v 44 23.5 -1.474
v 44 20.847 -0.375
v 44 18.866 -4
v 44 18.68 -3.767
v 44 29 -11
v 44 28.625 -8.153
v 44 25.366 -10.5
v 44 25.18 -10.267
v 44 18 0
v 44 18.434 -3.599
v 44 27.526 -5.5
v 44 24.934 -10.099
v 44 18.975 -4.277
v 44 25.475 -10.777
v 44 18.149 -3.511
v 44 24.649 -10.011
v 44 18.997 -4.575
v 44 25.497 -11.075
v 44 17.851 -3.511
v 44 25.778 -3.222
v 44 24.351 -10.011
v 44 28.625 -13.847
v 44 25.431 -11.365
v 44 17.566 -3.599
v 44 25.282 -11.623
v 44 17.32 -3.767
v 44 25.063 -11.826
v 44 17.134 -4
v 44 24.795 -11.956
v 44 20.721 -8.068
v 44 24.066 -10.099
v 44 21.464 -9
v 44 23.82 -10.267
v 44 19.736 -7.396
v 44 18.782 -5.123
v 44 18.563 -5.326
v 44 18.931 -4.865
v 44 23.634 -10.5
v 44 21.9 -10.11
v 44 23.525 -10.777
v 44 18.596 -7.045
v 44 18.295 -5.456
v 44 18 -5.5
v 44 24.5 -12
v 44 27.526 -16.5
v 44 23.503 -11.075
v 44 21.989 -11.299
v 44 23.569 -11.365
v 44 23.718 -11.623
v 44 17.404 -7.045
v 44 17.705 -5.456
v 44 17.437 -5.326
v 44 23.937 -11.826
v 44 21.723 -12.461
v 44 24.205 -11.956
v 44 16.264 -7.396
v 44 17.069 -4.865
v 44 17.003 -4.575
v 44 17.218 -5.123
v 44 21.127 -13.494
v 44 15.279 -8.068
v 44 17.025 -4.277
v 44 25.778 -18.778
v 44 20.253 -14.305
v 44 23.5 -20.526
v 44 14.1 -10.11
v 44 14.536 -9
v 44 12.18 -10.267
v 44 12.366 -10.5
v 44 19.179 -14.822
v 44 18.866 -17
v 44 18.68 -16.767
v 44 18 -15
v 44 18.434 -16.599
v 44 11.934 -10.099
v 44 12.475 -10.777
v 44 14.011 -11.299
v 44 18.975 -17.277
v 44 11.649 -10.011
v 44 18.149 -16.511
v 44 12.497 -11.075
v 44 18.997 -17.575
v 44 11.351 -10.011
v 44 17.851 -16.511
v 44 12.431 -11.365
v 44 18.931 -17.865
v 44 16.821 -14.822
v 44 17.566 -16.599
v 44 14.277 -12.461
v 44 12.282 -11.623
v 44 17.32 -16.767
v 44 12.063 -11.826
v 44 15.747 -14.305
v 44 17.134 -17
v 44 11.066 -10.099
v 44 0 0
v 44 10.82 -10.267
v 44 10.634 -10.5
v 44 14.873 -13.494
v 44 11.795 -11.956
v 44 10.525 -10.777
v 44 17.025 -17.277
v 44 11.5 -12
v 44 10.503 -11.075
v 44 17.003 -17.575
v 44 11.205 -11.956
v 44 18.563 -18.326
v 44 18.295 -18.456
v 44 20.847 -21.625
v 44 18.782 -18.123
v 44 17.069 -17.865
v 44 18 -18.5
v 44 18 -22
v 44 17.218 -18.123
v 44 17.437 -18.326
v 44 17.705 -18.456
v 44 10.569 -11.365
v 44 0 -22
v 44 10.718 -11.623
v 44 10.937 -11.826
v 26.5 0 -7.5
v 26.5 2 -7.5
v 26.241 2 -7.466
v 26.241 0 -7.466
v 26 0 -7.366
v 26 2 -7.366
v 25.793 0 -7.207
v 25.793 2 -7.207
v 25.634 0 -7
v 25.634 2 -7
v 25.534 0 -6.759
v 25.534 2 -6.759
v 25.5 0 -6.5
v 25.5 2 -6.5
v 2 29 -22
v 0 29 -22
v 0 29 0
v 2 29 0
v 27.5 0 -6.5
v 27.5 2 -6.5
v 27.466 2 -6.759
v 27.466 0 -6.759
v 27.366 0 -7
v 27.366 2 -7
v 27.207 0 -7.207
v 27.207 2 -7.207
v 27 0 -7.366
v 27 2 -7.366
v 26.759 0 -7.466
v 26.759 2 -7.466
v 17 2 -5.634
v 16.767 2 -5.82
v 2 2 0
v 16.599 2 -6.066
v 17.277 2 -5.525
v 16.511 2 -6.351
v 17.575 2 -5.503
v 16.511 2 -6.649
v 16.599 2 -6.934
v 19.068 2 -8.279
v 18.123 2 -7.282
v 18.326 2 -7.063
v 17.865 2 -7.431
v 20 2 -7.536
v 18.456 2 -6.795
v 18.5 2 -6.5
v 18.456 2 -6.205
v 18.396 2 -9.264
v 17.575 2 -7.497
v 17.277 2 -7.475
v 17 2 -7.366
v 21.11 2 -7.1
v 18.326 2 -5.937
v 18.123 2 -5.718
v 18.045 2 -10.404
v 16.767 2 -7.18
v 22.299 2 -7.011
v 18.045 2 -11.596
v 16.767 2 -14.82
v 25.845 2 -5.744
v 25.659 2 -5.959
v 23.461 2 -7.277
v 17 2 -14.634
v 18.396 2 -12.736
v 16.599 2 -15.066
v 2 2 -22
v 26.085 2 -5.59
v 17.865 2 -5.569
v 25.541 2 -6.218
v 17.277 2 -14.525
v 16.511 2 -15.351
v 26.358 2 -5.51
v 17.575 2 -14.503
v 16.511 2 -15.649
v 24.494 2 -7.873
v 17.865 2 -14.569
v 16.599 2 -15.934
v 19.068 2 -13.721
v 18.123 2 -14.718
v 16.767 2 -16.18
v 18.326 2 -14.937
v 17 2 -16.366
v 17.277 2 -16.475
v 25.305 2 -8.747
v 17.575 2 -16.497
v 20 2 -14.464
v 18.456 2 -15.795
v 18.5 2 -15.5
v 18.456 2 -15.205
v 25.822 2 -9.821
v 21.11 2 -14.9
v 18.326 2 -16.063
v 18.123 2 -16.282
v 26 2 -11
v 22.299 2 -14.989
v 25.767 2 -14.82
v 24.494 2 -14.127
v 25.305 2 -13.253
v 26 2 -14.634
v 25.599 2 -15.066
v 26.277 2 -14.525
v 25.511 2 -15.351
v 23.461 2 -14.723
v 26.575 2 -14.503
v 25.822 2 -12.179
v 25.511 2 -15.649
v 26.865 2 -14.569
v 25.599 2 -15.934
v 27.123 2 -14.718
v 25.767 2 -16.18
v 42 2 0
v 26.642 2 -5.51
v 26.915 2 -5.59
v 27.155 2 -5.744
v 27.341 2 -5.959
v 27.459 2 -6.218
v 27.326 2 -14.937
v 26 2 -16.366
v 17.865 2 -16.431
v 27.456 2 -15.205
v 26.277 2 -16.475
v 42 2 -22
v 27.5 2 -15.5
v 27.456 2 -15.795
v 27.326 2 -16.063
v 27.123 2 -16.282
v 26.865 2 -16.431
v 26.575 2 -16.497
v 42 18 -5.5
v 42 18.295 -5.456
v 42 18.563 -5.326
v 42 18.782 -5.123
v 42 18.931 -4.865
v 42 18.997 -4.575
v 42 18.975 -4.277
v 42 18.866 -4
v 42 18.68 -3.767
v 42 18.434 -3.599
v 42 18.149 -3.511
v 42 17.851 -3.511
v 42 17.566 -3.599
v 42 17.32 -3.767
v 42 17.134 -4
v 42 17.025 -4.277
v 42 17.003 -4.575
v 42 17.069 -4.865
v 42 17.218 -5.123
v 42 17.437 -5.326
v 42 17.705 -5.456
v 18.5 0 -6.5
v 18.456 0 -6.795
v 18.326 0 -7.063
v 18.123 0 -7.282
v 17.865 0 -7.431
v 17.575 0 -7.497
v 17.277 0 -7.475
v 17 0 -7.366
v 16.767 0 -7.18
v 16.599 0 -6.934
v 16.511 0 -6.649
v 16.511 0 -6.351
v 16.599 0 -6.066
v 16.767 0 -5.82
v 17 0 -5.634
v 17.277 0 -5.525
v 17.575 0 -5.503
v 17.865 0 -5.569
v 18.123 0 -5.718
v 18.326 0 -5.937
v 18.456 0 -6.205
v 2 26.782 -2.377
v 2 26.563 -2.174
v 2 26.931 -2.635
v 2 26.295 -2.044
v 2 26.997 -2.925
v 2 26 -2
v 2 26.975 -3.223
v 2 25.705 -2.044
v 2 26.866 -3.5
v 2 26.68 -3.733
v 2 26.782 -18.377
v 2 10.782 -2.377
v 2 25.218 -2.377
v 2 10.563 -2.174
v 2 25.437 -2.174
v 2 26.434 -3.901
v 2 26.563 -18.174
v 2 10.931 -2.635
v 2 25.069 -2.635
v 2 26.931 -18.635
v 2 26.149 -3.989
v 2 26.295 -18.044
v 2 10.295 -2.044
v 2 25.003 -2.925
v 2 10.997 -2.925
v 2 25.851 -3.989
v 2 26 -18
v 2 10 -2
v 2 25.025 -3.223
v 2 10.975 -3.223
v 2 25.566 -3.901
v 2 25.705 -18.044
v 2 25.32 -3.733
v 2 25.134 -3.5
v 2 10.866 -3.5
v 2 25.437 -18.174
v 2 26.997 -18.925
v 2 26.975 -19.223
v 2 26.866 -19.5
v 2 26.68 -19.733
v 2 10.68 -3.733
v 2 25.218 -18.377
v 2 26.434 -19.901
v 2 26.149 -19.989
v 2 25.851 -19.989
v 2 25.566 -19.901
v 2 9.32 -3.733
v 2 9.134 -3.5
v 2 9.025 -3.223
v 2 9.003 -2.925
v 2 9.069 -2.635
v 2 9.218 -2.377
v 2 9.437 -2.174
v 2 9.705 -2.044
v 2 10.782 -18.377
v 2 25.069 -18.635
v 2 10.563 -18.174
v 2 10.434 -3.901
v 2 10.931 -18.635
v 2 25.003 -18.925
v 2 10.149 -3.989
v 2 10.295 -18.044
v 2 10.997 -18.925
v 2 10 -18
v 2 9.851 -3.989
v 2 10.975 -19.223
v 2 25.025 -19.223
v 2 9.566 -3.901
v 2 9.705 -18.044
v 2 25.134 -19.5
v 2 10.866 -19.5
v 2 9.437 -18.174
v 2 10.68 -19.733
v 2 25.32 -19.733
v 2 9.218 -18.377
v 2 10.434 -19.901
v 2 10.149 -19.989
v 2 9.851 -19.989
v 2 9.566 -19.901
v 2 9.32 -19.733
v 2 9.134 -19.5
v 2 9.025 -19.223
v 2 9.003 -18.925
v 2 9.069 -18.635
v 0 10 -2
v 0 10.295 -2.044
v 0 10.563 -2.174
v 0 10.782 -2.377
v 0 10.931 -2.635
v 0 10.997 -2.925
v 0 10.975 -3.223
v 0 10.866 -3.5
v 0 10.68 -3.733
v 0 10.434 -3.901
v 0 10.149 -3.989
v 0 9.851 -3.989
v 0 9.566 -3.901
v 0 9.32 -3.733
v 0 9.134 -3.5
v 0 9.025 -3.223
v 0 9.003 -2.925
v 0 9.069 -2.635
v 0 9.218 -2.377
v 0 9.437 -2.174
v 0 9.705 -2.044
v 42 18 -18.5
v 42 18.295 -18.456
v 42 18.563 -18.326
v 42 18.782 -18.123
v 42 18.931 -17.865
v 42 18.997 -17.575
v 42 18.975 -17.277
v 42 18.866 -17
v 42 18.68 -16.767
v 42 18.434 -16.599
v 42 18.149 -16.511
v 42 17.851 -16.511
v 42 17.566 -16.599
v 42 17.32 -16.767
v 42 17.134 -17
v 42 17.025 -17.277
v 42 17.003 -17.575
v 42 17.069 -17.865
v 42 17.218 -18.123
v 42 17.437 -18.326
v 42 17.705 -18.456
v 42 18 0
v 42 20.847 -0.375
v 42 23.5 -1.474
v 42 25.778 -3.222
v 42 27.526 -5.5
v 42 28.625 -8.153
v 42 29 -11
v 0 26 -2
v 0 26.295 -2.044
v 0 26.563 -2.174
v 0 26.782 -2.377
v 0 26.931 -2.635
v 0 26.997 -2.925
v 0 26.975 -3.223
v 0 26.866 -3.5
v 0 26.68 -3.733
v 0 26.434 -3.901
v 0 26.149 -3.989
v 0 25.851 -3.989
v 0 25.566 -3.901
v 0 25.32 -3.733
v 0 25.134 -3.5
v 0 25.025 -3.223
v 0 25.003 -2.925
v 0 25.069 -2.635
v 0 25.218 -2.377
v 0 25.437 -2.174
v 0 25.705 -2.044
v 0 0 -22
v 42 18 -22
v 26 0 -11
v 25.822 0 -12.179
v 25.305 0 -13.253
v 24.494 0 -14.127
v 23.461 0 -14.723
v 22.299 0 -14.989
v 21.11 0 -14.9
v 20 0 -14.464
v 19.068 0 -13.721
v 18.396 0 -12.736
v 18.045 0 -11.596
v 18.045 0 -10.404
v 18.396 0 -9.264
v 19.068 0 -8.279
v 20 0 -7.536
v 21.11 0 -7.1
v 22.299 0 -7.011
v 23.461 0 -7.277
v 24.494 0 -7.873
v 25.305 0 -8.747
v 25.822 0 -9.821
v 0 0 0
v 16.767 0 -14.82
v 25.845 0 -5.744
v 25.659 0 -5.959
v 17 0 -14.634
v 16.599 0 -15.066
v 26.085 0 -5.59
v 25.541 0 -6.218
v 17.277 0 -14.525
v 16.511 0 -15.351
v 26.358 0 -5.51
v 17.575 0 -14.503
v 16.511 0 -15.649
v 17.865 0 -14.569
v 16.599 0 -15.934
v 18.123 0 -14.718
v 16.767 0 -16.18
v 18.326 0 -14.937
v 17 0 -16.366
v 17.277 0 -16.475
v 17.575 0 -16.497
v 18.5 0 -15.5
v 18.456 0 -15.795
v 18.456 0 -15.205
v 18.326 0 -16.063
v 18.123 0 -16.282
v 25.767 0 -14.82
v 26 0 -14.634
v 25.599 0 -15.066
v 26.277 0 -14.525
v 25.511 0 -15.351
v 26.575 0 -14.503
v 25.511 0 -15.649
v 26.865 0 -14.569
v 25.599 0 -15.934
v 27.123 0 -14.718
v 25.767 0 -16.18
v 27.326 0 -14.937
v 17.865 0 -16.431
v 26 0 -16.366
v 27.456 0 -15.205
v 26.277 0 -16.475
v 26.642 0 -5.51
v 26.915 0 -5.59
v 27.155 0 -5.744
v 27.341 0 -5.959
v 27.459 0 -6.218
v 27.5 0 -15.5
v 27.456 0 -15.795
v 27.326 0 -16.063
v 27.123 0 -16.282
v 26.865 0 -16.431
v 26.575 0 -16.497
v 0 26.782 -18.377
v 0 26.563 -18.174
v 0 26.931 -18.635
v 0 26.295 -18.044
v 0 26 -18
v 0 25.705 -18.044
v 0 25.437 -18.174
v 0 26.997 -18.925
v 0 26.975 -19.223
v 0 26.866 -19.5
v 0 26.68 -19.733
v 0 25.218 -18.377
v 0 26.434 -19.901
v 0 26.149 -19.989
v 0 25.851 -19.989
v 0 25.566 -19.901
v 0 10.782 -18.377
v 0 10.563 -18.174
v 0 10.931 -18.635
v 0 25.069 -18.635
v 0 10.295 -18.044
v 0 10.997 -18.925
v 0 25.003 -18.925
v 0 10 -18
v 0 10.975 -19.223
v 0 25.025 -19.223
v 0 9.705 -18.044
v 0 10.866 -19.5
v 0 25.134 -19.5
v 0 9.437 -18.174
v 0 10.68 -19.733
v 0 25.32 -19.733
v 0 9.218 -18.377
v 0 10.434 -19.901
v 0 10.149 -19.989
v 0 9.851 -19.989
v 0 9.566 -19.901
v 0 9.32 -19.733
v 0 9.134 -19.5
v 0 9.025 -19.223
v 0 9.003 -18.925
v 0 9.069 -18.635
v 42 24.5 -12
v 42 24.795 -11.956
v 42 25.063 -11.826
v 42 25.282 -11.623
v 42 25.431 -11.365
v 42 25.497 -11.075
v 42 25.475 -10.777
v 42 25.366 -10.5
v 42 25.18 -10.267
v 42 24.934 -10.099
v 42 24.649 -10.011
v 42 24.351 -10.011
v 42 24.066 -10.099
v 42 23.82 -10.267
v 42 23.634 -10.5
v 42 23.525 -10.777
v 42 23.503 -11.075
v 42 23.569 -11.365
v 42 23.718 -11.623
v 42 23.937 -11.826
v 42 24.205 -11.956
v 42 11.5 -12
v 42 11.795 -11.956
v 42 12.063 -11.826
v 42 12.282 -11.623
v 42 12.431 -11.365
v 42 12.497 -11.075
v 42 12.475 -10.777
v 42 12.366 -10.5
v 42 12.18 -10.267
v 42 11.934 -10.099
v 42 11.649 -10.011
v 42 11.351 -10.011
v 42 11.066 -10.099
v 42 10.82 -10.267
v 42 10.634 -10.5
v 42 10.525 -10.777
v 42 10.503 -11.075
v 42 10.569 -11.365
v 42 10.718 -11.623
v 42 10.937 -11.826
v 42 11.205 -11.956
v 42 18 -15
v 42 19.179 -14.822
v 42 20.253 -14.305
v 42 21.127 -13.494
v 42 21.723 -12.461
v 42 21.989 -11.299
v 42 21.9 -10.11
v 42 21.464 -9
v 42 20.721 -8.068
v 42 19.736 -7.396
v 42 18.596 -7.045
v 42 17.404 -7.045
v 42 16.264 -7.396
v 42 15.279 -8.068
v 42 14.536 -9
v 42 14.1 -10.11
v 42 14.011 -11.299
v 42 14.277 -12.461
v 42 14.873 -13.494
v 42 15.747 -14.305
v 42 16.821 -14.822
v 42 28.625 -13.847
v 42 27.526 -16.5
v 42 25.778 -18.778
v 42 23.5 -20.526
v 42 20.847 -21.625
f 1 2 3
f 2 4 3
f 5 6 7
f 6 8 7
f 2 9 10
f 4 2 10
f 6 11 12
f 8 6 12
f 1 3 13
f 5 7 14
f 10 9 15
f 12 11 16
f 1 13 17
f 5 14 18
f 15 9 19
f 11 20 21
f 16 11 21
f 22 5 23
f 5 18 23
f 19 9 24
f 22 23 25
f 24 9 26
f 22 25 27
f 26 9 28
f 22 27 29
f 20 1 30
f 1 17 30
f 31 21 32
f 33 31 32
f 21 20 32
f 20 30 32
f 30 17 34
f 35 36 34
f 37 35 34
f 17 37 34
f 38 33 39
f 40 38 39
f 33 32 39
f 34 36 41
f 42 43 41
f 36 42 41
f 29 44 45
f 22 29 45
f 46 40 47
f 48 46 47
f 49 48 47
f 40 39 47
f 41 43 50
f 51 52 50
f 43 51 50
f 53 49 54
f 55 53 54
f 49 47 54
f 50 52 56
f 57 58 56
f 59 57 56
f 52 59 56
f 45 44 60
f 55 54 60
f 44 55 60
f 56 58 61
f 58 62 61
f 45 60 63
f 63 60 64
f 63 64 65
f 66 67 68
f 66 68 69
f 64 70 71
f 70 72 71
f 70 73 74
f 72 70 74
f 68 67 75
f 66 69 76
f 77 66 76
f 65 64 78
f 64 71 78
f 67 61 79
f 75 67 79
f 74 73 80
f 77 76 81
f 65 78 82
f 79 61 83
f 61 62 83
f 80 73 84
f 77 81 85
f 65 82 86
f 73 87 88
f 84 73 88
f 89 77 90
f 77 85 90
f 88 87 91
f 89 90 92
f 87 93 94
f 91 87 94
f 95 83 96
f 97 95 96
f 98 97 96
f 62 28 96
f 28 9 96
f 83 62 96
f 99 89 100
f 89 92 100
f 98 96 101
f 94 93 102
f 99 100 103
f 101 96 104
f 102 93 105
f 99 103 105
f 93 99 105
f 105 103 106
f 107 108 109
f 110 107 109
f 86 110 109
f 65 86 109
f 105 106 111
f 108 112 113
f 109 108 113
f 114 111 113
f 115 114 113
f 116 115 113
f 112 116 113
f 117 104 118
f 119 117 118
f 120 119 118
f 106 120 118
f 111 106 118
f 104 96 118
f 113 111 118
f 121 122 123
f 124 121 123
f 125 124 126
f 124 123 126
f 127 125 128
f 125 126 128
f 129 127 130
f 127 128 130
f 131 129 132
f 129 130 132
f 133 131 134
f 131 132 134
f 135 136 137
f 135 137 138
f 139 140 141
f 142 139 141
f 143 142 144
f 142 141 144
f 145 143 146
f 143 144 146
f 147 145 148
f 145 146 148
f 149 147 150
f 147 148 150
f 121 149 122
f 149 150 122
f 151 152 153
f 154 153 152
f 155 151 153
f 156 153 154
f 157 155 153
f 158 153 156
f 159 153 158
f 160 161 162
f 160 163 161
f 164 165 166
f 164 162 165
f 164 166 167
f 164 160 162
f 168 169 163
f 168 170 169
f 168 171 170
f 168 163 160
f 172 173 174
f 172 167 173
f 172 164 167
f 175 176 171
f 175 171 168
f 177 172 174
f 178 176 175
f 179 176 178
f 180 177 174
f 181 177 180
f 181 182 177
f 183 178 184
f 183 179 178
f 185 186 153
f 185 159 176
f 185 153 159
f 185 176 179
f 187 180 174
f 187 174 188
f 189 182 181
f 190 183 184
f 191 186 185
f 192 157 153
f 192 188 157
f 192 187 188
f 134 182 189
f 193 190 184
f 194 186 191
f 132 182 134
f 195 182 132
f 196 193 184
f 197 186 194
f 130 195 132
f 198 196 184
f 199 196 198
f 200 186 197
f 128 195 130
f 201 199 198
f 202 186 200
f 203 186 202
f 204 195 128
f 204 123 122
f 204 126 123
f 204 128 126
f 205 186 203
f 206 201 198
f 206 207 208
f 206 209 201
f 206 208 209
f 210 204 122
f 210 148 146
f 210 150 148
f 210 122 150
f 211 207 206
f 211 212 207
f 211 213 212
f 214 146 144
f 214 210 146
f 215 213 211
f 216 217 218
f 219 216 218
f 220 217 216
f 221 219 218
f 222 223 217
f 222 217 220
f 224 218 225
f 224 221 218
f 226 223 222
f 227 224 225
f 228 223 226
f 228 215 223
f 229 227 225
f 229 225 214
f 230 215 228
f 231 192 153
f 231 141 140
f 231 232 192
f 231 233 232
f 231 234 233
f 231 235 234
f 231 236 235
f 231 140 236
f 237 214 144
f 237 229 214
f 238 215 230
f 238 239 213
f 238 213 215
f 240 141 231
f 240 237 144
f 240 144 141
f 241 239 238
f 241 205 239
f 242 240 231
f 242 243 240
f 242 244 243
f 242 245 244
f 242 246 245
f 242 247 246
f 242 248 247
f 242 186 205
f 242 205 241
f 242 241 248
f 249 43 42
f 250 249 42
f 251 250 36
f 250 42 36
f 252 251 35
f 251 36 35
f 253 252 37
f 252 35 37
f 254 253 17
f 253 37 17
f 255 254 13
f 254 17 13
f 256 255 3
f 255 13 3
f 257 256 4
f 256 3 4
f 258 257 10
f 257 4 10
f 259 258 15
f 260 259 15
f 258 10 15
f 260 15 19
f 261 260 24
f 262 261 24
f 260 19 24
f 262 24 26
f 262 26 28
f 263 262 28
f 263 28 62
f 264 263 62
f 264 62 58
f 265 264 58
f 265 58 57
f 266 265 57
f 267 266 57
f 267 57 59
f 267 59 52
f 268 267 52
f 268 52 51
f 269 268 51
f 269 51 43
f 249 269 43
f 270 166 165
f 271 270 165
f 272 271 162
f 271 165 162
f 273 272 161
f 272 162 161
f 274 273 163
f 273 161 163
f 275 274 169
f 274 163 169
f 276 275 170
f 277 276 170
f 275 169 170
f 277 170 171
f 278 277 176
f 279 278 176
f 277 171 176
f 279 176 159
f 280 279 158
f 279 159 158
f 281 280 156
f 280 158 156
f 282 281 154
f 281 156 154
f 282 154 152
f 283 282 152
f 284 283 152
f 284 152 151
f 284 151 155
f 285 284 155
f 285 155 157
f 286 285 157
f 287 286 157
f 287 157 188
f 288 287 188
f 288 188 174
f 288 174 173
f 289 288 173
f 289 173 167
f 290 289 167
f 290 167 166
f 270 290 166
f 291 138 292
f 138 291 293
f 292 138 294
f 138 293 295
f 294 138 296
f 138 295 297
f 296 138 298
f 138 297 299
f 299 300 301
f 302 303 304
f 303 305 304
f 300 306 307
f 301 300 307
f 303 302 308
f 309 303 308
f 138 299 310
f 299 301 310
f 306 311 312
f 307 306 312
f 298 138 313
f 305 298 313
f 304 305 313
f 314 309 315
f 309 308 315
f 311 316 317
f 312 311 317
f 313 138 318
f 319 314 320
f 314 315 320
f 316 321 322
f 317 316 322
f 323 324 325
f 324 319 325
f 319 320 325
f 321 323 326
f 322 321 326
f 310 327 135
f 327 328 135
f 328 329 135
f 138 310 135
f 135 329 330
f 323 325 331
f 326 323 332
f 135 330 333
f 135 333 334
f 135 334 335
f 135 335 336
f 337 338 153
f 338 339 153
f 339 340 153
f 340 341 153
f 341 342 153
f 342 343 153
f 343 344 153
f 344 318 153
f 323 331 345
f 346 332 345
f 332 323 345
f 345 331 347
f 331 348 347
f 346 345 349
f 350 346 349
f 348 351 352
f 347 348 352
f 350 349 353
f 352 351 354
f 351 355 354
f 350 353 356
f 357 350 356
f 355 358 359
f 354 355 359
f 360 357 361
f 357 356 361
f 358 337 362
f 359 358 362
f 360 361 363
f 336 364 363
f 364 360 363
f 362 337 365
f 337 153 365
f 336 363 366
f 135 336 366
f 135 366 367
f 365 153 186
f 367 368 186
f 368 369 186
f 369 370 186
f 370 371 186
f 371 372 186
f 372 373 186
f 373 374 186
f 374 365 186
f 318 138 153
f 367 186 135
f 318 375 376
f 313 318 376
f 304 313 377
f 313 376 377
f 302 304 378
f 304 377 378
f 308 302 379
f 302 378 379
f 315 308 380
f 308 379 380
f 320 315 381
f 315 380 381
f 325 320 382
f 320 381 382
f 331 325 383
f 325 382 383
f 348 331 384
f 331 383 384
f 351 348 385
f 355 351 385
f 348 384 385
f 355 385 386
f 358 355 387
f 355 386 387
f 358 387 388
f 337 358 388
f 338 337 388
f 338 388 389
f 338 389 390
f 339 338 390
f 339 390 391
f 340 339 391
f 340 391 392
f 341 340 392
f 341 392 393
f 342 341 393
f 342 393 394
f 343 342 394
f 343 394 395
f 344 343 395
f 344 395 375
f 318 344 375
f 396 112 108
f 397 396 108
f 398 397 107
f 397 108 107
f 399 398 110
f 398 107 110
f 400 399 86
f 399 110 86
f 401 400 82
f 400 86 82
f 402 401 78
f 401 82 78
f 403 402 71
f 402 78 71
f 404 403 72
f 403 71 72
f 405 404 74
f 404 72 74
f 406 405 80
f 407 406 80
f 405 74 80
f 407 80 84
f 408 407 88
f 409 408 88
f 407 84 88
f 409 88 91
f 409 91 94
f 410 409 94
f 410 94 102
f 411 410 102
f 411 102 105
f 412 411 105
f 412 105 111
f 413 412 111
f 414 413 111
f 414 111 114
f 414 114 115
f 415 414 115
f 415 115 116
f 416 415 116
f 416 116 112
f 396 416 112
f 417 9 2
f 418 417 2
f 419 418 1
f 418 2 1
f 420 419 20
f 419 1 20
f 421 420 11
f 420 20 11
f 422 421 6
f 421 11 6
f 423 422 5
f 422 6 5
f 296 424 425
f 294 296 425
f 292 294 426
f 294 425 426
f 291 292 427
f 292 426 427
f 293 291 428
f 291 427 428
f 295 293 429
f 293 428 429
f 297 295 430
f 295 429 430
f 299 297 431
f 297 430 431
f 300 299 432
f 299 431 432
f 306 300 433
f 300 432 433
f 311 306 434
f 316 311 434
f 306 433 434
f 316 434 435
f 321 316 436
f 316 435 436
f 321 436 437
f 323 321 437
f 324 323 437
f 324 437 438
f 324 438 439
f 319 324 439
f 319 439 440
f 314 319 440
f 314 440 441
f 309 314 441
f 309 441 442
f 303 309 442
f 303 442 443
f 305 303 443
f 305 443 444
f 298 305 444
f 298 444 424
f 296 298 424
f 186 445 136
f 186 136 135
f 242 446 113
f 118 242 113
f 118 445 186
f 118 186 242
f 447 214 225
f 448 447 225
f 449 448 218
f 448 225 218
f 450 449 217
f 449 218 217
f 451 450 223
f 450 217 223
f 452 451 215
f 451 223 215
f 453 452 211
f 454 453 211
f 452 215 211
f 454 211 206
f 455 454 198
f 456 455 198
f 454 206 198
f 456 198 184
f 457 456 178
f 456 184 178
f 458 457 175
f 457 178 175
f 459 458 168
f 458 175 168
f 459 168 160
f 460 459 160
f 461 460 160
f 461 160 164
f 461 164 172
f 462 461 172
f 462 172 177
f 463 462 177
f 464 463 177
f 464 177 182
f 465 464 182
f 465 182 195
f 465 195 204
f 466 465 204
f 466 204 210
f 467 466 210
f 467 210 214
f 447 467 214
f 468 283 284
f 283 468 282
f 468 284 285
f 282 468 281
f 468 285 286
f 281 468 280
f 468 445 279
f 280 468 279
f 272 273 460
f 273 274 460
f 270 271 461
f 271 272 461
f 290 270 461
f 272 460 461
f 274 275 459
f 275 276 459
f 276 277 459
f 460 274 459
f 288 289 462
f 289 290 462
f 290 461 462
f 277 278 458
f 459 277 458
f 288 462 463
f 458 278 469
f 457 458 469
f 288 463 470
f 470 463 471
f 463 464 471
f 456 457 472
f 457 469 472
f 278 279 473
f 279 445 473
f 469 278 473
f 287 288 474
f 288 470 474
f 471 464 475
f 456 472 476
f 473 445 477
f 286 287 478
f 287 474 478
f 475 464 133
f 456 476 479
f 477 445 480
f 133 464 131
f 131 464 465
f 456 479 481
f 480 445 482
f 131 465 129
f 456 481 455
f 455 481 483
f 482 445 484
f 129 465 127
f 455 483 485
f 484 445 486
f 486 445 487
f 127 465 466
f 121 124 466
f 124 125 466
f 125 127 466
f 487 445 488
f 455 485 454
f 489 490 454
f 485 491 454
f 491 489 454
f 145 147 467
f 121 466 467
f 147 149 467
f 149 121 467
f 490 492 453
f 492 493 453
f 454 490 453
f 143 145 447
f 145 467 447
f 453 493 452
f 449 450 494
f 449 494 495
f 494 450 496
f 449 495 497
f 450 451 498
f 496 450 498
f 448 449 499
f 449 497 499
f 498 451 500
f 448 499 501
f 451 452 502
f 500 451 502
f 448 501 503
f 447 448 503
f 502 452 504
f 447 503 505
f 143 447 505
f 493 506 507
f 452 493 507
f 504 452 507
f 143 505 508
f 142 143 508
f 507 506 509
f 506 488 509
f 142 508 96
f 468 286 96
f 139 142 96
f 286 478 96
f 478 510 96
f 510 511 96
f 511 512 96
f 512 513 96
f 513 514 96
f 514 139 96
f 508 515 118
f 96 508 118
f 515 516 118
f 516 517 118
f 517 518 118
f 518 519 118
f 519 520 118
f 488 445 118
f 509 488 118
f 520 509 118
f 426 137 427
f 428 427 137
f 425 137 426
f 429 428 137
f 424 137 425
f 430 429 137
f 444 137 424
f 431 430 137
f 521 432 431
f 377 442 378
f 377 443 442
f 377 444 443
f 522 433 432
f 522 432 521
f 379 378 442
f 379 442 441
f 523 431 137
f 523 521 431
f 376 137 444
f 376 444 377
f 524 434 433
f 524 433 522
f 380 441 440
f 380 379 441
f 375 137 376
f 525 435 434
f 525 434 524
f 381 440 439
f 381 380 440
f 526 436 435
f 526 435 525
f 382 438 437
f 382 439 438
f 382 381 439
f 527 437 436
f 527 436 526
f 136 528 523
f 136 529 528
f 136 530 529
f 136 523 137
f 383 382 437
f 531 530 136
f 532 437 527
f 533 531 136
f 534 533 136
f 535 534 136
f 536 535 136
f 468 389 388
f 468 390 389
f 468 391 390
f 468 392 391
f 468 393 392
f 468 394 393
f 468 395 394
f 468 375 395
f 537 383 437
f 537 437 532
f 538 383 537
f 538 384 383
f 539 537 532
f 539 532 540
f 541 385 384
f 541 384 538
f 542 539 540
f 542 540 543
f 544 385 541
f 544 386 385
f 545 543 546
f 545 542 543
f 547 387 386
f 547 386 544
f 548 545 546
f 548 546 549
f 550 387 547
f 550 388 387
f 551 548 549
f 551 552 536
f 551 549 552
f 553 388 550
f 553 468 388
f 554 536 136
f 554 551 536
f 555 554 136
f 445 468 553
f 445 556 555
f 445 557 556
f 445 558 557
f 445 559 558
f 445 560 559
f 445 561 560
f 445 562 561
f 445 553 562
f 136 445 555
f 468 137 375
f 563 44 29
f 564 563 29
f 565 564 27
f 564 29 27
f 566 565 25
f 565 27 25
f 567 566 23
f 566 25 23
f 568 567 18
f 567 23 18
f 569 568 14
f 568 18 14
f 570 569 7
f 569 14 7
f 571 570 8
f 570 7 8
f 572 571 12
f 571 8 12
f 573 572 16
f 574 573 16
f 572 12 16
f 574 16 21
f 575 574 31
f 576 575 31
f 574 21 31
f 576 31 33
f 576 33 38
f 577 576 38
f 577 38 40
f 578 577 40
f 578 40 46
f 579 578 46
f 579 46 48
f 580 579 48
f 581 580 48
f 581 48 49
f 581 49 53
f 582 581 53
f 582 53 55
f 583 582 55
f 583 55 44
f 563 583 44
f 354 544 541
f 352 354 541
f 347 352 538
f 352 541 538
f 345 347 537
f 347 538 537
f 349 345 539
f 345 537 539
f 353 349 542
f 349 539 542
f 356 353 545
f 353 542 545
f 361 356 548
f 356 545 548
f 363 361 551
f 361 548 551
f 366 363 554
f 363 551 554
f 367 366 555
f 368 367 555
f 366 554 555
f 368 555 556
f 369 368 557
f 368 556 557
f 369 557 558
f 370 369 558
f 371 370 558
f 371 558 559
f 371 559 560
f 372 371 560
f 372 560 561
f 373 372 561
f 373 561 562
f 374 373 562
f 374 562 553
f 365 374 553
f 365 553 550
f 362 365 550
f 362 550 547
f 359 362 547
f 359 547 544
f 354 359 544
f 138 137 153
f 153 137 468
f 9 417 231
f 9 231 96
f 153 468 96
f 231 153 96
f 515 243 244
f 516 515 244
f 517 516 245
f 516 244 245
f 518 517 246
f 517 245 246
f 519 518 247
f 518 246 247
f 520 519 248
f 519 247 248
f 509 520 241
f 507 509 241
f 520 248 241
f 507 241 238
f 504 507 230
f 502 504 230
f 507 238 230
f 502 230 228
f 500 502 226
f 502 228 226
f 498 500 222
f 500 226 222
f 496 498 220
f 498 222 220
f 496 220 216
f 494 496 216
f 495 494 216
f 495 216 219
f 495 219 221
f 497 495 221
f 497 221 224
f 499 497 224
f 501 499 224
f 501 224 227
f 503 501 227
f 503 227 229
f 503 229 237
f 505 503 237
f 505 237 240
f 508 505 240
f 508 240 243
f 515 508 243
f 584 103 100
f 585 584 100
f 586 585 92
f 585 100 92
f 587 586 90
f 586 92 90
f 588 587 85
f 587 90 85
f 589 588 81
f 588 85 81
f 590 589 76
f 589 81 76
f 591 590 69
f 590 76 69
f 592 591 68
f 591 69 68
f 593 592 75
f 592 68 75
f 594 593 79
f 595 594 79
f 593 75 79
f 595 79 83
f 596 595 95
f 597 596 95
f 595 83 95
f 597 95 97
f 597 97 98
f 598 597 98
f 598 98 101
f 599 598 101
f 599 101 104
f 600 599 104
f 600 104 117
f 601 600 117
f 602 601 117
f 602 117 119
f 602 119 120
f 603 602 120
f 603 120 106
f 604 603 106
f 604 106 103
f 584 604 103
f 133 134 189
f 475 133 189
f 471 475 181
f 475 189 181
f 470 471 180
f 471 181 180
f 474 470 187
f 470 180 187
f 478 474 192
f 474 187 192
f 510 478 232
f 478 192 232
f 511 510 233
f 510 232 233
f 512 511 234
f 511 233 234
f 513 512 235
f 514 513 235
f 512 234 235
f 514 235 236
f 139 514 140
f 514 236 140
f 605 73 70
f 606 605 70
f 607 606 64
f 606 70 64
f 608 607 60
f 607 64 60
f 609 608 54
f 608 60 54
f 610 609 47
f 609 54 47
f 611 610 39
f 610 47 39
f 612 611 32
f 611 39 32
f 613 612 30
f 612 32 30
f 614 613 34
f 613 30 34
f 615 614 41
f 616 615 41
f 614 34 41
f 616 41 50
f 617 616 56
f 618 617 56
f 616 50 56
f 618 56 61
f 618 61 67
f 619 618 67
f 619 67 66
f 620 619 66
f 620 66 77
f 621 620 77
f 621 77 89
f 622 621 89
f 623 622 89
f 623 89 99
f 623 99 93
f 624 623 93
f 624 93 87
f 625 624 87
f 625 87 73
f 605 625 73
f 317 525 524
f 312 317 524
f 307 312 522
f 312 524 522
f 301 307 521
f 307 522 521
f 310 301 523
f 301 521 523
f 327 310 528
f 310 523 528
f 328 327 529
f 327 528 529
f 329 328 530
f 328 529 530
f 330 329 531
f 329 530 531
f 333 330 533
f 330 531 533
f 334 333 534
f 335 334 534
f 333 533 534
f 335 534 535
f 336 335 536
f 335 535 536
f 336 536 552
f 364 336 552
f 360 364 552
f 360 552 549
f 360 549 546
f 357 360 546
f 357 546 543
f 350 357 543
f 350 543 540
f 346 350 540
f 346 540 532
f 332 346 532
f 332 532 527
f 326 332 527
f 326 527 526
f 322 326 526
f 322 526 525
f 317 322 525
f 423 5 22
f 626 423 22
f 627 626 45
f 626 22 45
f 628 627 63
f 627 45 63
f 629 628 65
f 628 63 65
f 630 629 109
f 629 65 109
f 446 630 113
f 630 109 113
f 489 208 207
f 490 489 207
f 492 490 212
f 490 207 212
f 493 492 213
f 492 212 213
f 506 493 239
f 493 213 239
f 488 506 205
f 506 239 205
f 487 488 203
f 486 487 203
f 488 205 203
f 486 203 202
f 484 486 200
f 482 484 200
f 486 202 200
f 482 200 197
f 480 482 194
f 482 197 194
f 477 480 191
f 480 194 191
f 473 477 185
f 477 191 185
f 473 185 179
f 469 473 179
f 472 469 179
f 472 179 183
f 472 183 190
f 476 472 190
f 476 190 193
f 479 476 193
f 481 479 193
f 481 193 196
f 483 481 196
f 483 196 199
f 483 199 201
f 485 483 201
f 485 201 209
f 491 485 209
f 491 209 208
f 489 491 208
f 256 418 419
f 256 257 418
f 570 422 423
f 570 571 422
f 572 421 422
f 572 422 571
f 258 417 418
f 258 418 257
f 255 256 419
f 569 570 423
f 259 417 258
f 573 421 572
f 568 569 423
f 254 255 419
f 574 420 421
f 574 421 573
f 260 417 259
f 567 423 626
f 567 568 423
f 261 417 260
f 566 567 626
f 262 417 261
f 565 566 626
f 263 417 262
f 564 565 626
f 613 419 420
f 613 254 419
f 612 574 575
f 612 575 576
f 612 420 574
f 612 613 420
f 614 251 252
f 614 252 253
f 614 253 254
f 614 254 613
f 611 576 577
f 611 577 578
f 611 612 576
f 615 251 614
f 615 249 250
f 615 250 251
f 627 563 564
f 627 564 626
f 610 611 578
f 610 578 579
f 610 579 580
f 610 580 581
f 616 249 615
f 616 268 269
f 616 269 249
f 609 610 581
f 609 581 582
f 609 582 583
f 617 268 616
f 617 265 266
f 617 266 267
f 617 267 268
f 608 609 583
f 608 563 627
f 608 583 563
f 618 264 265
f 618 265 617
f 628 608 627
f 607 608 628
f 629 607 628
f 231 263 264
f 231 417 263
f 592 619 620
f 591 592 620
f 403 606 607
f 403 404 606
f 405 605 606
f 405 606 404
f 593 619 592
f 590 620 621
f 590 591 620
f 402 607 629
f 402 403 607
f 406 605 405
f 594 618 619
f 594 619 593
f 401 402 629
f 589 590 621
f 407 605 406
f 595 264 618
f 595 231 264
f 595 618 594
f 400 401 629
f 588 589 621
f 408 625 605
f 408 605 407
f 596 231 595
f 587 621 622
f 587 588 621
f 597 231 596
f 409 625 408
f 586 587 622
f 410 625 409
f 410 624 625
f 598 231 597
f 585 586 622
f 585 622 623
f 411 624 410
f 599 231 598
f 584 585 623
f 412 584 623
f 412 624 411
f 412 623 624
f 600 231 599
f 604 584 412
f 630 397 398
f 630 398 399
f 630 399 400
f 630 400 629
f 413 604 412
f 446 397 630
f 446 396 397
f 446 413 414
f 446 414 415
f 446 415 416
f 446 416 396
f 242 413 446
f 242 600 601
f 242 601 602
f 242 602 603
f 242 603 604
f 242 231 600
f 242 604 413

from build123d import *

# Parameters (mm, degrees)
SKETCH1_W           = 44
SKETCH1_H           = 22
BOSS_EXTRUDE1_DEPTH = 2
SKETCH2_W           = 2
SKETCH2_H           = 22
BOSS_EXTRUDE2_DEPTH = 27
CUT_EXTRUDE1_REACH  = 46
CUT_EXTRUDE2_REACH  = 46
SKETCH4_R           = 1
CUT_EXTRUDE3_REACH  = 46
SKETCH5_R           = 4
SKETCH5_R_2         = 1
SKETCH6_R           = 1
SKETCH6_R_2         = 4
CUT_EXTRUDE4_DEPTH  = 5


with BuildPart() as part:
    # Sketch1 → Boss-Extrude1 (new body)
    with BuildSketch(Plane(origin=(0, 0, 0), x_dir=(1, 0, 0), z_dir=(0, 1, 0))):
        with Locations((22, 11)):
            Rectangle(SKETCH1_W, SKETCH1_H)
    extrude(amount=BOSS_EXTRUDE1_DEPTH)

    # Sketch2 → Boss-Extrude2 (add)
    with BuildSketch(Plane(origin=(0, 2, 0), x_dir=(1, 0, 0), z_dir=(0, 1, 0))):
        with Locations((1, 11)):
            Rectangle(SKETCH2_W, SKETCH2_H)
        with Locations((43, 11)):
            Rectangle(SKETCH2_W, SKETCH2_H)
    extrude(amount=BOSS_EXTRUDE2_DEPTH)

    # Sketch3 → Cut-Extrude1 (cut, up to next)
    with BuildSketch(Plane(origin=(44, 0, 0), x_dir=(0, 0, -1), z_dir=(1, 0, 0)), mode=Mode.PRIVATE) as cut_extrude1_sk1:
        with BuildLine():
            Line((11, 29), (0, 29))
            Line((0, 29), (0, 18))
            ThreePointArc((0, 18), (3.221825407, 25.778174593), (11, 29))
        make_face()
    cut_extrude1_tool1 = extrude(cut_extrude1_sk1.sketch, amount=-CUT_EXTRUDE1_REACH, mode=Mode.PRIVATE) & part.part
    add(cut_extrude1_tool1.solids().sort_by_distance((44, 26.542953, -2.457047))[0], mode=Mode.SUBTRACT)
    # Sketch3 → Cut-Extrude1 (cut, up to next)
    with BuildSketch(Plane(origin=(44, 0, 0), x_dir=(0, 0, -1), z_dir=(1, 0, 0)), mode=Mode.PRIVATE) as cut_extrude1_sk2:
        with BuildLine():
            Line((22, 29), (11, 29))
            ThreePointArc((11, 29), (18.778174593, 25.778174593), (22, 18))
            Line((22, 18), (22, 29))
        make_face()
    cut_extrude1_tool2 = extrude(cut_extrude1_sk2.sketch, amount=-CUT_EXTRUDE1_REACH, mode=Mode.PRIVATE) & part.part
    add(cut_extrude1_tool2.solids().sort_by_distance((44, 26.542953, -19.542953))[0], mode=Mode.SUBTRACT)

    # Sketch4 → Cut-Extrude2 (cut, up to next)
    with BuildSketch(Plane.ZY, mode=Mode.PRIVATE) as cut_extrude2_sk1:
        with Locations((-19, 10)):
            Circle(SKETCH4_R)
    cut_extrude2_tool1 = extrude(cut_extrude2_sk1.sketch, amount=-CUT_EXTRUDE2_REACH, mode=Mode.PRIVATE) & part.part
    add(cut_extrude2_tool1.solids().sort_by_distance((0, 10, -19))[0], mode=Mode.SUBTRACT)
    # Sketch4 → Cut-Extrude2 (cut, up to next)
    with BuildSketch(Plane.ZY, mode=Mode.PRIVATE) as cut_extrude2_sk2:
        with Locations((-19, 26)):
            Circle(SKETCH4_R)
    cut_extrude2_tool2 = extrude(cut_extrude2_sk2.sketch, amount=-CUT_EXTRUDE2_REACH, mode=Mode.PRIVATE) & part.part
    add(cut_extrude2_tool2.solids().sort_by_distance((0, 26, -19))[0], mode=Mode.SUBTRACT)
    # Sketch4 → Cut-Extrude2 (cut, up to next)
    with BuildSketch(Plane.ZY, mode=Mode.PRIVATE) as cut_extrude2_sk3:
        with Locations((-3, 10)):
            Circle(SKETCH4_R)
    cut_extrude2_tool3 = extrude(cut_extrude2_sk3.sketch, amount=-CUT_EXTRUDE2_REACH, mode=Mode.PRIVATE) & part.part
    add(cut_extrude2_tool3.solids().sort_by_distance((0, 10, -3))[0], mode=Mode.SUBTRACT)
    # Sketch4 → Cut-Extrude2 (cut, up to next)
    with BuildSketch(Plane.ZY, mode=Mode.PRIVATE) as cut_extrude2_sk4:
        with Locations((-3, 26)):
            Circle(SKETCH4_R)
    cut_extrude2_tool4 = extrude(cut_extrude2_sk4.sketch, amount=-CUT_EXTRUDE2_REACH, mode=Mode.PRIVATE) & part.part
    add(cut_extrude2_tool4.solids().sort_by_distance((0, 26, -3))[0], mode=Mode.SUBTRACT)

    # Sketch5 → Cut-Extrude3 (cut, up to next)
    with BuildSketch(Plane(origin=(44, 0, 0), x_dir=(0, 0, -1), z_dir=(1, 0, 0)), mode=Mode.PRIVATE) as cut_extrude3_sk1:
        with Locations((11, 18)):
            Circle(SKETCH5_R)
    cut_extrude3_tool1 = extrude(cut_extrude3_sk1.sketch, amount=-CUT_EXTRUDE3_REACH, mode=Mode.PRIVATE) & part.part
    add(cut_extrude3_tool1.solids().sort_by_distance((44, 18, -11))[0], mode=Mode.SUBTRACT)
    # Sketch5 → Cut-Extrude3 (cut, up to next)
    with BuildSketch(Plane(origin=(44, 0, 0), x_dir=(0, 0, -1), z_dir=(1, 0, 0)), mode=Mode.PRIVATE) as cut_extrude3_sk2:
        with Locations((17.5, 18)):
            Circle(SKETCH5_R_2)
    cut_extrude3_tool2 = extrude(cut_extrude3_sk2.sketch, amount=-CUT_EXTRUDE3_REACH, mode=Mode.PRIVATE) & part.part
    add(cut_extrude3_tool2.solids().sort_by_distance((44, 18, -17.5))[0], mode=Mode.SUBTRACT)
    # Sketch5 → Cut-Extrude3 (cut, up to next)
    with BuildSketch(Plane(origin=(44, 0, 0), x_dir=(0, 0, -1), z_dir=(1, 0, 0)), mode=Mode.PRIVATE) as cut_extrude3_sk3:
        with Locations((11, 24.5)):
            Circle(SKETCH5_R_2)
    cut_extrude3_tool3 = extrude(cut_extrude3_sk3.sketch, amount=-CUT_EXTRUDE3_REACH, mode=Mode.PRIVATE) & part.part
    add(cut_extrude3_tool3.solids().sort_by_distance((44, 24.5, -11))[0], mode=Mode.SUBTRACT)
    # Sketch5 → Cut-Extrude3 (cut, up to next)
    with BuildSketch(Plane(origin=(44, 0, 0), x_dir=(0, 0, -1), z_dir=(1, 0, 0)), mode=Mode.PRIVATE) as cut_extrude3_sk4:
        with Locations((4.5, 18)):
            Circle(SKETCH5_R_2)
    cut_extrude3_tool4 = extrude(cut_extrude3_sk4.sketch, amount=-CUT_EXTRUDE3_REACH, mode=Mode.PRIVATE) & part.part
    add(cut_extrude3_tool4.solids().sort_by_distance((44, 18, -4.5))[0], mode=Mode.SUBTRACT)
    # Sketch5 → Cut-Extrude3 (cut, up to next)
    with BuildSketch(Plane(origin=(44, 0, 0), x_dir=(0, 0, -1), z_dir=(1, 0, 0)), mode=Mode.PRIVATE) as cut_extrude3_sk5:
        with Locations((11, 11.5)):
            Circle(SKETCH5_R_2)
    cut_extrude3_tool5 = extrude(cut_extrude3_sk5.sketch, amount=-CUT_EXTRUDE3_REACH, mode=Mode.PRIVATE) & part.part
    add(cut_extrude3_tool5.solids().sort_by_distance((44, 11.5, -11))[0], mode=Mode.SUBTRACT)

    # Sketch6 → Cut-Extrude4 (cut)
    with BuildSketch(Plane(origin=(0, 2, 0), x_dir=(1, 0, 0), z_dir=(0, 1, 0))):
        with BuildLine():
            ThreePointArc((26.5, 7.5), (25.792893219, 7.207106781), (25.5, 6.5))
            Line((25.5, 6.5), (26.5, 6.5))
            Line((26.5, 6.5), (26.5, 7.5))
        make_face()
        with BuildLine():
            Line((26.5, 6.5), (25.5, 6.5))
            ThreePointArc((25.5, 6.5), (26.5, 5.5), (27.5, 6.5))
            ThreePointArc((27.5, 6.5), (27.207106781, 7.207106781), (26.5, 7.5))
            Line((26.5, 7.5), (26.5, 6.5))
        make_face()
        with Locations((17.5, 6.5)):
            Circle(SKETCH6_R)
        with Locations((17.5, 15.5)):
            Circle(SKETCH6_R)
        with Locations((26.5, 15.5)):
            Circle(SKETCH6_R)
        with Locations((22, 11)):
            Circle(SKETCH6_R_2)
    extrude(amount=-CUT_EXTRUDE4_DEPTH, mode=Mode.SUBTRACT)


solid = part.part
